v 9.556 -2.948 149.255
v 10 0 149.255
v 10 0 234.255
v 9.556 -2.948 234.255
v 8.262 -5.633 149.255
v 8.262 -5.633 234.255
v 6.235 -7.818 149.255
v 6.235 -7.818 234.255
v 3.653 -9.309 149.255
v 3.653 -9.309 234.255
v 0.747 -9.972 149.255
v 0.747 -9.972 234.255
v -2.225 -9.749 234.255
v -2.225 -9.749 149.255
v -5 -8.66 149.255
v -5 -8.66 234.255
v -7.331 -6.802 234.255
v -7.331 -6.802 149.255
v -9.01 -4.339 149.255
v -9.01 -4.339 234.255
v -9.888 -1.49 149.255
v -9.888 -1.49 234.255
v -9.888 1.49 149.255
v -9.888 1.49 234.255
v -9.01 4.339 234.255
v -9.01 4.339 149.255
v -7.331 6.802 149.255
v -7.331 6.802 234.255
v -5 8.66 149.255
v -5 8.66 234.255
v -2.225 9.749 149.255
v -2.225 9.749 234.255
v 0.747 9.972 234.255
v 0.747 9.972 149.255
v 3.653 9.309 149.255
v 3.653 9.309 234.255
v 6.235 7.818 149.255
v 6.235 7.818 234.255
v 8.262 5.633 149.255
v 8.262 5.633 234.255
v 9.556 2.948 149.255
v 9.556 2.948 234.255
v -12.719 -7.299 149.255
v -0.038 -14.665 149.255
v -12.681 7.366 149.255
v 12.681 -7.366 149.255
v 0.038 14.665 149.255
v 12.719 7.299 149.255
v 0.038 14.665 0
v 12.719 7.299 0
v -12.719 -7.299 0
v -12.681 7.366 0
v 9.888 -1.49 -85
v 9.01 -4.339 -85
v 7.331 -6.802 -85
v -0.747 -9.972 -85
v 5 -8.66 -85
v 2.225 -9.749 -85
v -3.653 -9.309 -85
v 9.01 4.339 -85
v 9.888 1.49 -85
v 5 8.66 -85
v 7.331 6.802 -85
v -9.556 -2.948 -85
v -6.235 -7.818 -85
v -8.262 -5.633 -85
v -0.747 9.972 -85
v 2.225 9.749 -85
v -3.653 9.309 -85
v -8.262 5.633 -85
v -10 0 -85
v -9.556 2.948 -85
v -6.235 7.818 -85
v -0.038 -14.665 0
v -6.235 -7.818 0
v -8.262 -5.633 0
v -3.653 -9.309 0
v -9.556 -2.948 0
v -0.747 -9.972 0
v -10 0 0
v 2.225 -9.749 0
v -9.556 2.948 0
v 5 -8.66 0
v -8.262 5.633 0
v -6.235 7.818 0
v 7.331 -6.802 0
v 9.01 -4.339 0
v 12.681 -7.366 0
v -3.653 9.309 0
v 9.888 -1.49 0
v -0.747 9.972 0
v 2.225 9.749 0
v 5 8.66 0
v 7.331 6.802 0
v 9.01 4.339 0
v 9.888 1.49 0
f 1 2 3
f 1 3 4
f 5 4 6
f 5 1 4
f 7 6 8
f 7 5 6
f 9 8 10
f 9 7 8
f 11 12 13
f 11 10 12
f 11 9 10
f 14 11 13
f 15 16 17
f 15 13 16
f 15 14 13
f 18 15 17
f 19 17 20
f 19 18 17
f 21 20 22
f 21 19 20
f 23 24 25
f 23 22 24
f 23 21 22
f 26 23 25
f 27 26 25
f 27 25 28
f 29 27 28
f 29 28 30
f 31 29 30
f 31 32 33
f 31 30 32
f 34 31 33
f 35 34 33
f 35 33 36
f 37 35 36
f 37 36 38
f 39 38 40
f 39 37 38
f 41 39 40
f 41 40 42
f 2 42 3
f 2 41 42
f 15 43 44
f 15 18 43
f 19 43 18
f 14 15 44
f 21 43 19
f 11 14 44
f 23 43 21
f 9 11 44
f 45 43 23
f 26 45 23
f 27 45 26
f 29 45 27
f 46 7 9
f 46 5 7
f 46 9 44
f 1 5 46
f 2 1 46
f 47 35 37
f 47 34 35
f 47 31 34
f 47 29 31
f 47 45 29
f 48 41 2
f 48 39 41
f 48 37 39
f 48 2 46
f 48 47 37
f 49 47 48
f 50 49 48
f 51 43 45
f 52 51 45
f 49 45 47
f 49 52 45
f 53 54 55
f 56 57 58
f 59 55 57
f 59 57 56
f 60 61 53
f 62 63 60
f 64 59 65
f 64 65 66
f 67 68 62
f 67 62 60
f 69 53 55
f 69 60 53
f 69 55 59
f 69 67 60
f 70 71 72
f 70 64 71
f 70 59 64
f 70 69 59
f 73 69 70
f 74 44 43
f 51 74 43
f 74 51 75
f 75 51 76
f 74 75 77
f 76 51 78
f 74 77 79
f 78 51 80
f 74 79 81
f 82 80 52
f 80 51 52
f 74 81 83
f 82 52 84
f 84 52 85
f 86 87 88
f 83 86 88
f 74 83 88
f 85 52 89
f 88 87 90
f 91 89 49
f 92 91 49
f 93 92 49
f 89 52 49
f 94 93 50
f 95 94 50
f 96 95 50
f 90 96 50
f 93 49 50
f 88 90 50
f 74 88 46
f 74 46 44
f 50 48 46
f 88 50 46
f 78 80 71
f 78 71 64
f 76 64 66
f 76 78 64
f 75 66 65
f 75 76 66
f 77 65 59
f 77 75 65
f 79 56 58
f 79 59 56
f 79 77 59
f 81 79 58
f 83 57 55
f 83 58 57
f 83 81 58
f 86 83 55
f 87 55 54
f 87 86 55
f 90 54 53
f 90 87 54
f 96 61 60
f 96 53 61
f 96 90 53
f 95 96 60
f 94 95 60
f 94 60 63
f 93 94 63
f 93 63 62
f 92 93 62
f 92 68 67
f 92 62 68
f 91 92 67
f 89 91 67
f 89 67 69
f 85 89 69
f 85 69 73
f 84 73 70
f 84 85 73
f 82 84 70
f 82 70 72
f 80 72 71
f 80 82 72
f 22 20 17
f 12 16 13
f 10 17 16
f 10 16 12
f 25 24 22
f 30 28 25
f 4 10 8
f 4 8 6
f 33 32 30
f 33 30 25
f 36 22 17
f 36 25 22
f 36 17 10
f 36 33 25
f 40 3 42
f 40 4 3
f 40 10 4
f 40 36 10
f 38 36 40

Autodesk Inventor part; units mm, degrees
ref_plane "YZ Plane" through (0, 0, 0) normal (1, 0, 0) x (0, 1, 0)
ref_plane "XZ Plane" through (0, 0, 0) normal (0, 1, 0) x (-1, 0, 0)
ref_plane "XY Plane" through (0, 0, 0) normal (0, 0, 1) x (1, 0, 0)
sketch "Sketch1" plane through (0, 0, 0) normal (0, 0, 1) x (1, 0, 0)
  line L0 (-12.6808, 7.3656) -> (0.0383, 14.6647)
  line L1 (0.0383, 14.6647) -> (12.7192, 7.2991)
  line L2 (12.7192, 7.2991) -> (12.6808, -7.3656)
  line L3 (12.6808, -7.3656) -> (-0.0383, -14.6647)
  line L4 (-0.0383, -14.6647) -> (-12.7192, -7.2991)
  line L5 (-12.7192, -7.2991) -> (-12.6808, 7.3656)
  point P0 (0, 0)
  dimension "d10" = 29.3294
extrude "Extrusion1" add sketch "Sketch1" along normal blind 149.255
sketch "Sketch2" plane through (0, 0, 0) normal (0, 0, -1) x (-1, 0, 0)
  circle A0 centre (0, 0) radius 10
  dimension "d13" = 20
sketch "Sketch3" plane through (0, 0, 149.255) normal (0, 0, 1) x (1, 0, 0)
  circle A0 centre (0, 0) radius 10
  dimension "d14" = 20
extrude "Extrusion2" add sketch "Sketch3" along normal blind 85
extrude "Extrusion3" add sketch "Sketch2" along normal blind 85
properties part number "HexBar1Inch"
